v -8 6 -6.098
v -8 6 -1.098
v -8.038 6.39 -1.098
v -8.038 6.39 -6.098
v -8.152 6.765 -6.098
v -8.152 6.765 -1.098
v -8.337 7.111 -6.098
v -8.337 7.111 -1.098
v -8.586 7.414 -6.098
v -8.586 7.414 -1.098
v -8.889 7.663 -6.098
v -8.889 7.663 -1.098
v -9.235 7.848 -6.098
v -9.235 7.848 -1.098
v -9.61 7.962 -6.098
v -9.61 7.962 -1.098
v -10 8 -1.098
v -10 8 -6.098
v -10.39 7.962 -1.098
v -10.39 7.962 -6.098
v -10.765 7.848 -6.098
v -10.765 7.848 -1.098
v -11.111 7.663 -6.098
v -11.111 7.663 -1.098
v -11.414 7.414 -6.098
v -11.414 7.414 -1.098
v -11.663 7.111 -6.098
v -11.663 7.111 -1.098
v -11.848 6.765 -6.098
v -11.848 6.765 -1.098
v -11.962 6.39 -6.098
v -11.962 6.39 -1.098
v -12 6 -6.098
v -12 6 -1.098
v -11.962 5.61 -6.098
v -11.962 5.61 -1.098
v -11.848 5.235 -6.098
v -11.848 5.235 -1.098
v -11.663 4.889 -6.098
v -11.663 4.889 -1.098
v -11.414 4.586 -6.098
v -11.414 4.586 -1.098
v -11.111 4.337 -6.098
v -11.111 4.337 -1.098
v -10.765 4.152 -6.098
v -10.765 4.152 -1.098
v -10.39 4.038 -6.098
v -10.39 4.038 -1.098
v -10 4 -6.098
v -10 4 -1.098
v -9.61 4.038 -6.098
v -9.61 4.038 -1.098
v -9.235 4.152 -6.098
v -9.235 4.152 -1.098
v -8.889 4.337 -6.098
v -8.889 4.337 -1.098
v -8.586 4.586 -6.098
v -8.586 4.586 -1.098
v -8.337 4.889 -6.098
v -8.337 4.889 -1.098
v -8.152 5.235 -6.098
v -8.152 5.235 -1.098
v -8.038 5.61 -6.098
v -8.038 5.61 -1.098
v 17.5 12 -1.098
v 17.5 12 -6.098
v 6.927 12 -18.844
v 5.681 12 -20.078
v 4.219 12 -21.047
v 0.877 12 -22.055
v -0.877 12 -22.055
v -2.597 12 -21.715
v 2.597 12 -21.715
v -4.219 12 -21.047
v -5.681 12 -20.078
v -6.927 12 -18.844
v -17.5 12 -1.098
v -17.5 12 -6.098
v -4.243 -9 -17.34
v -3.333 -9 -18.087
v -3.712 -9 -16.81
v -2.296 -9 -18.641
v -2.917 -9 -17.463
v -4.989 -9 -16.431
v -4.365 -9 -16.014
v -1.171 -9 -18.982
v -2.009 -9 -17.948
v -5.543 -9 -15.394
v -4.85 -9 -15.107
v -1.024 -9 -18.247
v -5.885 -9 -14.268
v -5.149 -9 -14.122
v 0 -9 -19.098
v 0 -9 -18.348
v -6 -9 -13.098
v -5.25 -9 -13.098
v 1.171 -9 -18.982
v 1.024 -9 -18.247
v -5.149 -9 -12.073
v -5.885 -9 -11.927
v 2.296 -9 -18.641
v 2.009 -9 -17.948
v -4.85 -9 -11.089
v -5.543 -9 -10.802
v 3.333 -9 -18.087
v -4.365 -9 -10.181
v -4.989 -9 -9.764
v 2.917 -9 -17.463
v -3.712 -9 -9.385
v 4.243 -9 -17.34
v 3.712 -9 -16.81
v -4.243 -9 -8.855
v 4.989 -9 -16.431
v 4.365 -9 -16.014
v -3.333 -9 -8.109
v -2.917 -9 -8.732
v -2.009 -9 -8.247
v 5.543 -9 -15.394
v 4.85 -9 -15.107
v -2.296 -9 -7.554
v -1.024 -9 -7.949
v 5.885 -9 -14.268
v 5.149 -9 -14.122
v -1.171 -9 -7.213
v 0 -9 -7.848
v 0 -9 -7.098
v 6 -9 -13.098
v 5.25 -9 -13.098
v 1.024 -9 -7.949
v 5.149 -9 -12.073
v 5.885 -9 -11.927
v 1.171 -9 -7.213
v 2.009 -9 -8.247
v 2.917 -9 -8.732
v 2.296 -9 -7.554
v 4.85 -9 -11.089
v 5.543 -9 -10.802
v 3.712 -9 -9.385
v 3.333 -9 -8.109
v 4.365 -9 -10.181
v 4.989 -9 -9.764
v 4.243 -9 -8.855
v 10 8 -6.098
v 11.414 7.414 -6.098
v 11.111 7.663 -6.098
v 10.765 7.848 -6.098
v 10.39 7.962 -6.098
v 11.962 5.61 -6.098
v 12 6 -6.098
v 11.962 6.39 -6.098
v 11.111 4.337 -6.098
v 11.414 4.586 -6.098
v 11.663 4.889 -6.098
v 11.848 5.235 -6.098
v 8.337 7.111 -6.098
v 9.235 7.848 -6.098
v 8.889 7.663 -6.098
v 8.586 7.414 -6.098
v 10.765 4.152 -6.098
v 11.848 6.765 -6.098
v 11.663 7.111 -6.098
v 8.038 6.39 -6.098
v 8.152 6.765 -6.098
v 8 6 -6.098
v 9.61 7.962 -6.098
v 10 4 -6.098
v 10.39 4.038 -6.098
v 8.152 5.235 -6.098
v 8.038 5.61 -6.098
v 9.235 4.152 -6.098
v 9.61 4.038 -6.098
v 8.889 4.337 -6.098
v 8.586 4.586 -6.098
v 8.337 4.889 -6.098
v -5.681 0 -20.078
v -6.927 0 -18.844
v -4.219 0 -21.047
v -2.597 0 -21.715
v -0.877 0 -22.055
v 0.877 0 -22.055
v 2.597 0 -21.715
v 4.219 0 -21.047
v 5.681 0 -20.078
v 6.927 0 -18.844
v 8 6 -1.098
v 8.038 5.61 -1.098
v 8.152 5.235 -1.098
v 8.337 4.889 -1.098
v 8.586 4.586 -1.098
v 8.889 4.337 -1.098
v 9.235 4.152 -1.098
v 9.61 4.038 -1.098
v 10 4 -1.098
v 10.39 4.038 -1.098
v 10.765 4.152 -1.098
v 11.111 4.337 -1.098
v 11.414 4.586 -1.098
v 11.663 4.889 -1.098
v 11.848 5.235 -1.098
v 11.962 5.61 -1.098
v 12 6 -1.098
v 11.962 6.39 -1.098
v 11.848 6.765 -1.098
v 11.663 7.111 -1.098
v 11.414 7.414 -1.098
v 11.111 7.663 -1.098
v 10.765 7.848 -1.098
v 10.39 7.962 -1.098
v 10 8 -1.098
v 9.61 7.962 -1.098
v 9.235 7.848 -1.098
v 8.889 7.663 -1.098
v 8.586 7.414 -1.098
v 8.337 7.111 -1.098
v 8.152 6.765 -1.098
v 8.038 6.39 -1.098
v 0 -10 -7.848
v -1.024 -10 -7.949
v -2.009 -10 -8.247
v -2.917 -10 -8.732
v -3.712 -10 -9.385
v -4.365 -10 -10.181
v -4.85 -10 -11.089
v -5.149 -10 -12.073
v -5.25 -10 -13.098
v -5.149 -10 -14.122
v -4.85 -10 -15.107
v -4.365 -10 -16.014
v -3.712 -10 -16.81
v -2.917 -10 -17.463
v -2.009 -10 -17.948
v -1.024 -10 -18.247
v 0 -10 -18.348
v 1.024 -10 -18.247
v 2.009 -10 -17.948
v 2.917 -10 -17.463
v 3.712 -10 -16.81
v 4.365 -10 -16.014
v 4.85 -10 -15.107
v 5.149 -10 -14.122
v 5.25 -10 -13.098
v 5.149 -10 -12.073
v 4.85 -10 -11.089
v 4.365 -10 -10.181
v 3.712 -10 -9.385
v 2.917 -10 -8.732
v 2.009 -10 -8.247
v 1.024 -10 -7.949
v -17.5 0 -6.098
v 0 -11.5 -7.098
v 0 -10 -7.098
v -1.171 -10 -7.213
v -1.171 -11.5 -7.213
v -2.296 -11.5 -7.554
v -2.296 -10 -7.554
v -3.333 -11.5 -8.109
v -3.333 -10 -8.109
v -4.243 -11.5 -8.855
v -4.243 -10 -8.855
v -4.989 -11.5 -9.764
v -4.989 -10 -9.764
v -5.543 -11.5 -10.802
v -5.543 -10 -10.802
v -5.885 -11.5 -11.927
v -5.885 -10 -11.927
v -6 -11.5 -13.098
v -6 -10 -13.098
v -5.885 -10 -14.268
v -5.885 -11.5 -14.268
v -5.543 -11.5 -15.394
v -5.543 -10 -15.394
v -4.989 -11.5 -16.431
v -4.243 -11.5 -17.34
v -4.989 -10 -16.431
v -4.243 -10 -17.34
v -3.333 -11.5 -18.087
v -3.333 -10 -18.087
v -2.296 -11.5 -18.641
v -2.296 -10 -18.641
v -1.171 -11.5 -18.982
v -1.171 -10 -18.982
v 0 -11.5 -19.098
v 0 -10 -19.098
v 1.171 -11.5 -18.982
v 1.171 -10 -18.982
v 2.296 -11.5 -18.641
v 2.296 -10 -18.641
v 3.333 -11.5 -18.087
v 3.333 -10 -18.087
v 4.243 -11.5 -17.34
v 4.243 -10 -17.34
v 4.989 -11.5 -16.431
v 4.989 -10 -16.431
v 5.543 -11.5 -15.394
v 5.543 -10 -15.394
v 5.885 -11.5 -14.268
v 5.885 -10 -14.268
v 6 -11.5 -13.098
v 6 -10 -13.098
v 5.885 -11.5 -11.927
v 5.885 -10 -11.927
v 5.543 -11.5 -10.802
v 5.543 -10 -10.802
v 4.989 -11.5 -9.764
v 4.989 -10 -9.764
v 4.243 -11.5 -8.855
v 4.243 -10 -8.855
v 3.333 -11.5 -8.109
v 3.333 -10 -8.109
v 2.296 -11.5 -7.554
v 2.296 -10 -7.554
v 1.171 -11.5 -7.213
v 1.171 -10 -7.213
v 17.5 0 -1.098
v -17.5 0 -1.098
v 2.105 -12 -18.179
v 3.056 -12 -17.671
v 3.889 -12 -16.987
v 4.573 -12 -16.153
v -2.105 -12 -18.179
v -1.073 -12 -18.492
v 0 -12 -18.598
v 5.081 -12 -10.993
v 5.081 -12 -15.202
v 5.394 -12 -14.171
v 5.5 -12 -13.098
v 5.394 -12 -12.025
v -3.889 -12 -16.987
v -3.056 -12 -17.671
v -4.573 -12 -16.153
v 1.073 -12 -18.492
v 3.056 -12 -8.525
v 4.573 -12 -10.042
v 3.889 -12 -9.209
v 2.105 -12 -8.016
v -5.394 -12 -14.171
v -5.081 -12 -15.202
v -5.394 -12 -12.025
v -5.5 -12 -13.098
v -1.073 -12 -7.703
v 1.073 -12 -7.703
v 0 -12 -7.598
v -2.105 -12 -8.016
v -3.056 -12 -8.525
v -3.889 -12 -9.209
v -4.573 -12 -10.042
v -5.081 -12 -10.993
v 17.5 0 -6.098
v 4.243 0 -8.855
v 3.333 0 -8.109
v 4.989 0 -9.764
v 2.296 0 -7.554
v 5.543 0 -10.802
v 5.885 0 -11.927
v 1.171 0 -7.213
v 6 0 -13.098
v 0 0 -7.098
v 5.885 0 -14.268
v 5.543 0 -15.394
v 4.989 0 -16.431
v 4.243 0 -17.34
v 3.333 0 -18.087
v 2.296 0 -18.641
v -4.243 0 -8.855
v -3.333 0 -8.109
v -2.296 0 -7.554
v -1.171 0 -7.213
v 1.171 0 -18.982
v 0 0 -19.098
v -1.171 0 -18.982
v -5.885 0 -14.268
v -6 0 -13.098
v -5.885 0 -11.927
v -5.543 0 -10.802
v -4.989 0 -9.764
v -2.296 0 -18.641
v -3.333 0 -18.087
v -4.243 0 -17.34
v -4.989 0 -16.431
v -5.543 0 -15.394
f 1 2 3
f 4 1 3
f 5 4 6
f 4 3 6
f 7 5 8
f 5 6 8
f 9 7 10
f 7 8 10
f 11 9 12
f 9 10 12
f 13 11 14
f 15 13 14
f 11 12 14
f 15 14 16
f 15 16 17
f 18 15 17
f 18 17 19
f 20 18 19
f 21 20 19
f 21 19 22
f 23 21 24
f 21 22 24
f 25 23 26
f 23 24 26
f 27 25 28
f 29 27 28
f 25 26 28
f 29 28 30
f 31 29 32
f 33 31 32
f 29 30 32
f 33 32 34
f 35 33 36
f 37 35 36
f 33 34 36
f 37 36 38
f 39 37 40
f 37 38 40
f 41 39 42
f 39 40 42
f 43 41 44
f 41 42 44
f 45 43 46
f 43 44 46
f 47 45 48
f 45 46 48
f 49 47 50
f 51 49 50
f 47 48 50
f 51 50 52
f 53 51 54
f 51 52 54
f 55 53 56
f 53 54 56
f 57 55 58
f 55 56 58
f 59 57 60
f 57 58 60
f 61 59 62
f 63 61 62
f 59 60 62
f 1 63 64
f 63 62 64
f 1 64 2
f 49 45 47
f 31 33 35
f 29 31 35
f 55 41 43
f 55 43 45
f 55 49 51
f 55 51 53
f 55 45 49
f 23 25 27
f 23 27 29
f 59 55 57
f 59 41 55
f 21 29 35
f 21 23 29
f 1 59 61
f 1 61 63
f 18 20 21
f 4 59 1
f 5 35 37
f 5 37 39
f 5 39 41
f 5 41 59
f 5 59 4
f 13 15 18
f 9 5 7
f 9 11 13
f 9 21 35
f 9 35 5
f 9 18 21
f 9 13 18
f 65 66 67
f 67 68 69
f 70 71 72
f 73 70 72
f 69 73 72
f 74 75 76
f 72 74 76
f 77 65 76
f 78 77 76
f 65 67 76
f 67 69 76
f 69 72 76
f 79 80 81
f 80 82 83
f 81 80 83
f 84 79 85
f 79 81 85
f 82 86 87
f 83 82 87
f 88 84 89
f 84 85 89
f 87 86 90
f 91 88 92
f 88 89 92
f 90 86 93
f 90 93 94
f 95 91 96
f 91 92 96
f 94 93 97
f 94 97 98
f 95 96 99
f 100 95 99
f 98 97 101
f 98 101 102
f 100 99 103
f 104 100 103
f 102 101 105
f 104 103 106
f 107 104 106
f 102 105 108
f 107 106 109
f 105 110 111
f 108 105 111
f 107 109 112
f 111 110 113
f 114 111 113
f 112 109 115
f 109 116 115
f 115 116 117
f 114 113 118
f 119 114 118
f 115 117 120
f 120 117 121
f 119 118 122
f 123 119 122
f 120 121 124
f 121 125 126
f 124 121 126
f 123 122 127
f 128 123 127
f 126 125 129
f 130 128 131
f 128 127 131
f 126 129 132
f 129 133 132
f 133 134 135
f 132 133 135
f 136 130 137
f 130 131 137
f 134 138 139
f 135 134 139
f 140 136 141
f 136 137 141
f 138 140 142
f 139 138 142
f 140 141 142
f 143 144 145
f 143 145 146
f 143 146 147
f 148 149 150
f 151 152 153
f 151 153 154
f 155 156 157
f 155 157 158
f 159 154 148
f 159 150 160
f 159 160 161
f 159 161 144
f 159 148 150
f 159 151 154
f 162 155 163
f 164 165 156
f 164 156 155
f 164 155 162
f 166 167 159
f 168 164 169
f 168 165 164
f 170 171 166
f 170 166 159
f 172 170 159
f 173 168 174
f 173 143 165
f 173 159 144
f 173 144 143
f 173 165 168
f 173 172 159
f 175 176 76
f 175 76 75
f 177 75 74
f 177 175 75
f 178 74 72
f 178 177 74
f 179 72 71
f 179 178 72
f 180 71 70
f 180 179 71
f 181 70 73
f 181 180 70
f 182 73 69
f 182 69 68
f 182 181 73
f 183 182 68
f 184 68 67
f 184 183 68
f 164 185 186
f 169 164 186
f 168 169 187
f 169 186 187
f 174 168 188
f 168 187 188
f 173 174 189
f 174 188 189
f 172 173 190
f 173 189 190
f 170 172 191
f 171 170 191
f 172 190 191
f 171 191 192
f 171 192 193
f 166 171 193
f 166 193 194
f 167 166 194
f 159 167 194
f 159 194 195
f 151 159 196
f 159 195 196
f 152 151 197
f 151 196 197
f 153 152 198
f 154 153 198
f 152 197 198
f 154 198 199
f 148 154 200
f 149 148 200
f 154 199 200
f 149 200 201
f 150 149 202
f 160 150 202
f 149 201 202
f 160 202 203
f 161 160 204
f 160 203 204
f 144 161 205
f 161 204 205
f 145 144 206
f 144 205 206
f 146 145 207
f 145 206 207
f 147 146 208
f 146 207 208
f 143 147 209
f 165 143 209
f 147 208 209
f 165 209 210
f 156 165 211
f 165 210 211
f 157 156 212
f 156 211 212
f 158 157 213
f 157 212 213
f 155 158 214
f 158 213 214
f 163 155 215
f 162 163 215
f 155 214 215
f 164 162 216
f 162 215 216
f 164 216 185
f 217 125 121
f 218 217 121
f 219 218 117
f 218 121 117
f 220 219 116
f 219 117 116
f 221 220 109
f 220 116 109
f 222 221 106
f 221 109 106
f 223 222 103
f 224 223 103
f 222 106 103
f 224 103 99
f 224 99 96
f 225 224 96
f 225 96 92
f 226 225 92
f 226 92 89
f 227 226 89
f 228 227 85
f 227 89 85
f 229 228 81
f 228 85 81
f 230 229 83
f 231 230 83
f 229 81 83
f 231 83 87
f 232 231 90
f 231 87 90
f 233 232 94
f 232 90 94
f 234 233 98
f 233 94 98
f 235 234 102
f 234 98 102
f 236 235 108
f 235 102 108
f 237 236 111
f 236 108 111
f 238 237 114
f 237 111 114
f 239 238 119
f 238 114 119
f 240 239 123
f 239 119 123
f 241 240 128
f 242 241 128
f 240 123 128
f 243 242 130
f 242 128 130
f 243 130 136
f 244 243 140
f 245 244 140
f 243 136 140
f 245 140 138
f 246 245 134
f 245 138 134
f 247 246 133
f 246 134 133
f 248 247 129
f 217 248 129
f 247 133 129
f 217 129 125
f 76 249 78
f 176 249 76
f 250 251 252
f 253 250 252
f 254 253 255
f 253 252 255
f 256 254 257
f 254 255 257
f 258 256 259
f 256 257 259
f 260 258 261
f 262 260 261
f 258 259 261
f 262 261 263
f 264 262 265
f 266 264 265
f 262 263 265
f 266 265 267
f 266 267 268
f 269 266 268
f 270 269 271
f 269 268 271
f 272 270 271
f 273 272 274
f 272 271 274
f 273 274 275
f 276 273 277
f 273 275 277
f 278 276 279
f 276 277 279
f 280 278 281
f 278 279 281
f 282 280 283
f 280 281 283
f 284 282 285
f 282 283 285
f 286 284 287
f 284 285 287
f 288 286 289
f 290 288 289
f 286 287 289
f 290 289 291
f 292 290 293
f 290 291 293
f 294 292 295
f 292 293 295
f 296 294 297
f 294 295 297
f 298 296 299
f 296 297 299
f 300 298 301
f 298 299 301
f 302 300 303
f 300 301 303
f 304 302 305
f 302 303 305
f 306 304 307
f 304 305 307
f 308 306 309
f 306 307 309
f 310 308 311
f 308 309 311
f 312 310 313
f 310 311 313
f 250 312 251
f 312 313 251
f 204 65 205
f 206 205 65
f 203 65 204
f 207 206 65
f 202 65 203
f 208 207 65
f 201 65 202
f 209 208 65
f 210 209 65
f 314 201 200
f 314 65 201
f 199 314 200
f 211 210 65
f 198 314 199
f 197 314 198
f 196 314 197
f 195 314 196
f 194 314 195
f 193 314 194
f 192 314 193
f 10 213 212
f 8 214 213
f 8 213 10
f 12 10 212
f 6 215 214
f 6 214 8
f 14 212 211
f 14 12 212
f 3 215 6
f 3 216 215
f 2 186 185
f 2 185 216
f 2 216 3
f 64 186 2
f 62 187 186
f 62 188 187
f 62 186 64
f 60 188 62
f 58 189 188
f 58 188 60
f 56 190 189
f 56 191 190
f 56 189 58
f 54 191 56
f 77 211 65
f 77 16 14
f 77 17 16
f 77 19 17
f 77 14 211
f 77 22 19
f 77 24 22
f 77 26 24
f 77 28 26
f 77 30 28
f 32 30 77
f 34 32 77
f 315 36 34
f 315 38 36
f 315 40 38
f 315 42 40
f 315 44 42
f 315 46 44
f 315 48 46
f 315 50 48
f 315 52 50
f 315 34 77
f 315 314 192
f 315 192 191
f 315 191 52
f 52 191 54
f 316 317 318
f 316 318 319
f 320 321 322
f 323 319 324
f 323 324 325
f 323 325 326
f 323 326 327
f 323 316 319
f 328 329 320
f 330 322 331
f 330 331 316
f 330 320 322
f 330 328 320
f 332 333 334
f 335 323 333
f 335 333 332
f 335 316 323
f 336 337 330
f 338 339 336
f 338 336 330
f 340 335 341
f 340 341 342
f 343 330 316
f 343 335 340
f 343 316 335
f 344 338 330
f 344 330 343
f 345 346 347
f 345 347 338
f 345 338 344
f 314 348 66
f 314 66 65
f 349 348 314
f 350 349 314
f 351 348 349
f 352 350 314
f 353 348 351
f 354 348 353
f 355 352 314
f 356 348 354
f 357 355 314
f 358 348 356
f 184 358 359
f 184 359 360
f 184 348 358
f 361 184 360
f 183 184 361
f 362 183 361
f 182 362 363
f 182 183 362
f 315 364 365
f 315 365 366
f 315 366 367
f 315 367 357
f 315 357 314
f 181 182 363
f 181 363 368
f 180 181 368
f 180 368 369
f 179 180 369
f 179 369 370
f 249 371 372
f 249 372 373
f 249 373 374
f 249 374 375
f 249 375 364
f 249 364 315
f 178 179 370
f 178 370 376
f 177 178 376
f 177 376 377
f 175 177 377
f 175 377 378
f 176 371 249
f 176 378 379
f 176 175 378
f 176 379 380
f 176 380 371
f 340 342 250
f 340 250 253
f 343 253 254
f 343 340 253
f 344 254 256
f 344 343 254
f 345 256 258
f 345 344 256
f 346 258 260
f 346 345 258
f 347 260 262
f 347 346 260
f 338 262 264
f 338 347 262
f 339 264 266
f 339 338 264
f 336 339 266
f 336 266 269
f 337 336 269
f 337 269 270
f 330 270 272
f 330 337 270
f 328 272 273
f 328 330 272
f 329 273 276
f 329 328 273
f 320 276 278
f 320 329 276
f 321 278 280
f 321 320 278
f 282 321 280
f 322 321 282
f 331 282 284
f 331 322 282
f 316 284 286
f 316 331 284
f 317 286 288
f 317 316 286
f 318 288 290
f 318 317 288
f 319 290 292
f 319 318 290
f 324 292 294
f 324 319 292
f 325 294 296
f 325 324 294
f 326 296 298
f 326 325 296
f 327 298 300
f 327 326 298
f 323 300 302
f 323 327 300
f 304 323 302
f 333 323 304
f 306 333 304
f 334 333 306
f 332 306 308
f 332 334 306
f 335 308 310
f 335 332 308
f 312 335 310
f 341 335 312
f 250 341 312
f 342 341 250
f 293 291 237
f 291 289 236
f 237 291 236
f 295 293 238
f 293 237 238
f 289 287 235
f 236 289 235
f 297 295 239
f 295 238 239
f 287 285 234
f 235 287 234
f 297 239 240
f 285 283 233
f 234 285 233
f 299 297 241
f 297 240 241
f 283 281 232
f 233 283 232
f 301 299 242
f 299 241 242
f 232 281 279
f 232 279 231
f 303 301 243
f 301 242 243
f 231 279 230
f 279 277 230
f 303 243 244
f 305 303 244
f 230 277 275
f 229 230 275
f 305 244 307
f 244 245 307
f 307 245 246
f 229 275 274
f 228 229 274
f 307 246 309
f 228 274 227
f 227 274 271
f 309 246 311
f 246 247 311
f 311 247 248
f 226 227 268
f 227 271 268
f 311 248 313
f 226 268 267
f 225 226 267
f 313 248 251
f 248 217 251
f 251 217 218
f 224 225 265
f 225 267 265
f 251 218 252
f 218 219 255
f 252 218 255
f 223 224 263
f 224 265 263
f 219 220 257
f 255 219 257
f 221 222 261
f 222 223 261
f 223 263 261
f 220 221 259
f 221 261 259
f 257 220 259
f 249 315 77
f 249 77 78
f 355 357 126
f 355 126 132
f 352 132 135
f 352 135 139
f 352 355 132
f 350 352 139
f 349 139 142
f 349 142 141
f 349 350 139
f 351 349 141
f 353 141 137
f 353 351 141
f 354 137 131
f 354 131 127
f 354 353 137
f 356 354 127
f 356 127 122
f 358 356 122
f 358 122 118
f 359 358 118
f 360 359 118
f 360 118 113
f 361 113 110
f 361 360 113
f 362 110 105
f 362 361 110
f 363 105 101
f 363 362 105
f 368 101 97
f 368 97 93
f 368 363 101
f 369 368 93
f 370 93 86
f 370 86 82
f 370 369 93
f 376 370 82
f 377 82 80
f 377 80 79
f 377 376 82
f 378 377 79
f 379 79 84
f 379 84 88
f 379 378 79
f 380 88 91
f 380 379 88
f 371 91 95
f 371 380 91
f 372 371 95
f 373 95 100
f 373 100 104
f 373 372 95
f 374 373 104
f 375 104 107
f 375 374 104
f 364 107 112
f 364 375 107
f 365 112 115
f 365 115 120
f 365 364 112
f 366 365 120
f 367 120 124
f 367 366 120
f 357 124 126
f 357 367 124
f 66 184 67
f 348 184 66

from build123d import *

# Parameters (mm, degrees)
EXTRUDE_1_DEPTH     = 12
SKETCH_2_R          = 6
EXTRUDE_2_DEPTH     = 9
SKETCH_3_R          = 5.25
EXTRUDE_3_DEPTH     = 1
SKETCH_4_R          = 6
EXTRUDE_4_DEPTH     = 2
CHAMFER_1_SIZE      = 0.5
SKETCH_5_R          = 2
CUT_EXTRUDE_1_DEPTH = 5


with BuildPart() as part:
    # 草图1 → 凸台-拉伸1 (new body)
    with BuildSketch(Plane(origin=(0, 0, 0), x_dir=(1, 0, 0), z_dir=(0, 1, 0))):
        with BuildLine():
            Line((-17.5, 6.09769995), (-6.926984364, 18.843732288))
            ThreePointArc((-6.926984364, 18.843732288), (0, 22.09769995), (6.926984364, 18.843732288))
            Line((6.926984364, 18.843732288), (17.5, 6.09769995))
            Line((17.5, 6.09769995), (17.5, 1.09769995))
            Line((17.5, 1.09769995), (-17.5, 1.09769995))
            Line((-17.5, 1.09769995), (-17.5, 6.09769995))
        make_face()
    extrude(amount=EXTRUDE_1_DEPTH)

    # 草图2 → 凸台-拉伸2 (add)
    with BuildSketch(Plane(origin=(0, 0, 0), x_dir=(1, 0, 0), z_dir=(0, 1, 0))):
        with Locations(Location((0, 13.09769995, 0), (0, 0, 270))):
            Circle(SKETCH_2_R)
    extrude(amount=-EXTRUDE_2_DEPTH)

    # 草图3 → 凸台-拉伸3 (add)
    with BuildSketch(Plane(origin=(0, -9, 0), x_dir=(-1, 0, 0), z_dir=(0, -1, 0))):
        with Locations(Location((0, 13.09769995, 0), (0, 0, 270))):
            Circle(SKETCH_3_R)
    extrude(amount=EXTRUDE_3_DEPTH)

    # 草图4 → 凸台-拉伸4 (add)
    with BuildSketch(Plane(origin=(0, -10, 0), x_dir=(-1, 0, 0), z_dir=(0, -1, 0))):
        with Locations(Location((0, 13.09769995, 0), (0, 0, 270))):
            Circle(SKETCH_4_R)
    extrude(amount=EXTRUDE_4_DEPTH)

    # 倒角1
    chamfer_1_edges = [part.edges().sort_by_distance(p)[0] for p in [
        (0, -12, -19.09769995),
    ]]
    chamfer(chamfer_1_edges, length=CHAMFER_1_SIZE)

    # 草图5 → 切除-拉伸1 (cut)
    with BuildSketch(Plane.XY.offset(-1.09769995)):
        with Locations((-10, 6)):
            Circle(SKETCH_5_R)
        with Locations(Location((10, 6, 0), (0, 0, 180))):
            Circle(SKETCH_5_R)
    extrude(amount=-CUT_EXTRUDE_1_DEPTH, mode=Mode.SUBTRACT)


solid = part.part
